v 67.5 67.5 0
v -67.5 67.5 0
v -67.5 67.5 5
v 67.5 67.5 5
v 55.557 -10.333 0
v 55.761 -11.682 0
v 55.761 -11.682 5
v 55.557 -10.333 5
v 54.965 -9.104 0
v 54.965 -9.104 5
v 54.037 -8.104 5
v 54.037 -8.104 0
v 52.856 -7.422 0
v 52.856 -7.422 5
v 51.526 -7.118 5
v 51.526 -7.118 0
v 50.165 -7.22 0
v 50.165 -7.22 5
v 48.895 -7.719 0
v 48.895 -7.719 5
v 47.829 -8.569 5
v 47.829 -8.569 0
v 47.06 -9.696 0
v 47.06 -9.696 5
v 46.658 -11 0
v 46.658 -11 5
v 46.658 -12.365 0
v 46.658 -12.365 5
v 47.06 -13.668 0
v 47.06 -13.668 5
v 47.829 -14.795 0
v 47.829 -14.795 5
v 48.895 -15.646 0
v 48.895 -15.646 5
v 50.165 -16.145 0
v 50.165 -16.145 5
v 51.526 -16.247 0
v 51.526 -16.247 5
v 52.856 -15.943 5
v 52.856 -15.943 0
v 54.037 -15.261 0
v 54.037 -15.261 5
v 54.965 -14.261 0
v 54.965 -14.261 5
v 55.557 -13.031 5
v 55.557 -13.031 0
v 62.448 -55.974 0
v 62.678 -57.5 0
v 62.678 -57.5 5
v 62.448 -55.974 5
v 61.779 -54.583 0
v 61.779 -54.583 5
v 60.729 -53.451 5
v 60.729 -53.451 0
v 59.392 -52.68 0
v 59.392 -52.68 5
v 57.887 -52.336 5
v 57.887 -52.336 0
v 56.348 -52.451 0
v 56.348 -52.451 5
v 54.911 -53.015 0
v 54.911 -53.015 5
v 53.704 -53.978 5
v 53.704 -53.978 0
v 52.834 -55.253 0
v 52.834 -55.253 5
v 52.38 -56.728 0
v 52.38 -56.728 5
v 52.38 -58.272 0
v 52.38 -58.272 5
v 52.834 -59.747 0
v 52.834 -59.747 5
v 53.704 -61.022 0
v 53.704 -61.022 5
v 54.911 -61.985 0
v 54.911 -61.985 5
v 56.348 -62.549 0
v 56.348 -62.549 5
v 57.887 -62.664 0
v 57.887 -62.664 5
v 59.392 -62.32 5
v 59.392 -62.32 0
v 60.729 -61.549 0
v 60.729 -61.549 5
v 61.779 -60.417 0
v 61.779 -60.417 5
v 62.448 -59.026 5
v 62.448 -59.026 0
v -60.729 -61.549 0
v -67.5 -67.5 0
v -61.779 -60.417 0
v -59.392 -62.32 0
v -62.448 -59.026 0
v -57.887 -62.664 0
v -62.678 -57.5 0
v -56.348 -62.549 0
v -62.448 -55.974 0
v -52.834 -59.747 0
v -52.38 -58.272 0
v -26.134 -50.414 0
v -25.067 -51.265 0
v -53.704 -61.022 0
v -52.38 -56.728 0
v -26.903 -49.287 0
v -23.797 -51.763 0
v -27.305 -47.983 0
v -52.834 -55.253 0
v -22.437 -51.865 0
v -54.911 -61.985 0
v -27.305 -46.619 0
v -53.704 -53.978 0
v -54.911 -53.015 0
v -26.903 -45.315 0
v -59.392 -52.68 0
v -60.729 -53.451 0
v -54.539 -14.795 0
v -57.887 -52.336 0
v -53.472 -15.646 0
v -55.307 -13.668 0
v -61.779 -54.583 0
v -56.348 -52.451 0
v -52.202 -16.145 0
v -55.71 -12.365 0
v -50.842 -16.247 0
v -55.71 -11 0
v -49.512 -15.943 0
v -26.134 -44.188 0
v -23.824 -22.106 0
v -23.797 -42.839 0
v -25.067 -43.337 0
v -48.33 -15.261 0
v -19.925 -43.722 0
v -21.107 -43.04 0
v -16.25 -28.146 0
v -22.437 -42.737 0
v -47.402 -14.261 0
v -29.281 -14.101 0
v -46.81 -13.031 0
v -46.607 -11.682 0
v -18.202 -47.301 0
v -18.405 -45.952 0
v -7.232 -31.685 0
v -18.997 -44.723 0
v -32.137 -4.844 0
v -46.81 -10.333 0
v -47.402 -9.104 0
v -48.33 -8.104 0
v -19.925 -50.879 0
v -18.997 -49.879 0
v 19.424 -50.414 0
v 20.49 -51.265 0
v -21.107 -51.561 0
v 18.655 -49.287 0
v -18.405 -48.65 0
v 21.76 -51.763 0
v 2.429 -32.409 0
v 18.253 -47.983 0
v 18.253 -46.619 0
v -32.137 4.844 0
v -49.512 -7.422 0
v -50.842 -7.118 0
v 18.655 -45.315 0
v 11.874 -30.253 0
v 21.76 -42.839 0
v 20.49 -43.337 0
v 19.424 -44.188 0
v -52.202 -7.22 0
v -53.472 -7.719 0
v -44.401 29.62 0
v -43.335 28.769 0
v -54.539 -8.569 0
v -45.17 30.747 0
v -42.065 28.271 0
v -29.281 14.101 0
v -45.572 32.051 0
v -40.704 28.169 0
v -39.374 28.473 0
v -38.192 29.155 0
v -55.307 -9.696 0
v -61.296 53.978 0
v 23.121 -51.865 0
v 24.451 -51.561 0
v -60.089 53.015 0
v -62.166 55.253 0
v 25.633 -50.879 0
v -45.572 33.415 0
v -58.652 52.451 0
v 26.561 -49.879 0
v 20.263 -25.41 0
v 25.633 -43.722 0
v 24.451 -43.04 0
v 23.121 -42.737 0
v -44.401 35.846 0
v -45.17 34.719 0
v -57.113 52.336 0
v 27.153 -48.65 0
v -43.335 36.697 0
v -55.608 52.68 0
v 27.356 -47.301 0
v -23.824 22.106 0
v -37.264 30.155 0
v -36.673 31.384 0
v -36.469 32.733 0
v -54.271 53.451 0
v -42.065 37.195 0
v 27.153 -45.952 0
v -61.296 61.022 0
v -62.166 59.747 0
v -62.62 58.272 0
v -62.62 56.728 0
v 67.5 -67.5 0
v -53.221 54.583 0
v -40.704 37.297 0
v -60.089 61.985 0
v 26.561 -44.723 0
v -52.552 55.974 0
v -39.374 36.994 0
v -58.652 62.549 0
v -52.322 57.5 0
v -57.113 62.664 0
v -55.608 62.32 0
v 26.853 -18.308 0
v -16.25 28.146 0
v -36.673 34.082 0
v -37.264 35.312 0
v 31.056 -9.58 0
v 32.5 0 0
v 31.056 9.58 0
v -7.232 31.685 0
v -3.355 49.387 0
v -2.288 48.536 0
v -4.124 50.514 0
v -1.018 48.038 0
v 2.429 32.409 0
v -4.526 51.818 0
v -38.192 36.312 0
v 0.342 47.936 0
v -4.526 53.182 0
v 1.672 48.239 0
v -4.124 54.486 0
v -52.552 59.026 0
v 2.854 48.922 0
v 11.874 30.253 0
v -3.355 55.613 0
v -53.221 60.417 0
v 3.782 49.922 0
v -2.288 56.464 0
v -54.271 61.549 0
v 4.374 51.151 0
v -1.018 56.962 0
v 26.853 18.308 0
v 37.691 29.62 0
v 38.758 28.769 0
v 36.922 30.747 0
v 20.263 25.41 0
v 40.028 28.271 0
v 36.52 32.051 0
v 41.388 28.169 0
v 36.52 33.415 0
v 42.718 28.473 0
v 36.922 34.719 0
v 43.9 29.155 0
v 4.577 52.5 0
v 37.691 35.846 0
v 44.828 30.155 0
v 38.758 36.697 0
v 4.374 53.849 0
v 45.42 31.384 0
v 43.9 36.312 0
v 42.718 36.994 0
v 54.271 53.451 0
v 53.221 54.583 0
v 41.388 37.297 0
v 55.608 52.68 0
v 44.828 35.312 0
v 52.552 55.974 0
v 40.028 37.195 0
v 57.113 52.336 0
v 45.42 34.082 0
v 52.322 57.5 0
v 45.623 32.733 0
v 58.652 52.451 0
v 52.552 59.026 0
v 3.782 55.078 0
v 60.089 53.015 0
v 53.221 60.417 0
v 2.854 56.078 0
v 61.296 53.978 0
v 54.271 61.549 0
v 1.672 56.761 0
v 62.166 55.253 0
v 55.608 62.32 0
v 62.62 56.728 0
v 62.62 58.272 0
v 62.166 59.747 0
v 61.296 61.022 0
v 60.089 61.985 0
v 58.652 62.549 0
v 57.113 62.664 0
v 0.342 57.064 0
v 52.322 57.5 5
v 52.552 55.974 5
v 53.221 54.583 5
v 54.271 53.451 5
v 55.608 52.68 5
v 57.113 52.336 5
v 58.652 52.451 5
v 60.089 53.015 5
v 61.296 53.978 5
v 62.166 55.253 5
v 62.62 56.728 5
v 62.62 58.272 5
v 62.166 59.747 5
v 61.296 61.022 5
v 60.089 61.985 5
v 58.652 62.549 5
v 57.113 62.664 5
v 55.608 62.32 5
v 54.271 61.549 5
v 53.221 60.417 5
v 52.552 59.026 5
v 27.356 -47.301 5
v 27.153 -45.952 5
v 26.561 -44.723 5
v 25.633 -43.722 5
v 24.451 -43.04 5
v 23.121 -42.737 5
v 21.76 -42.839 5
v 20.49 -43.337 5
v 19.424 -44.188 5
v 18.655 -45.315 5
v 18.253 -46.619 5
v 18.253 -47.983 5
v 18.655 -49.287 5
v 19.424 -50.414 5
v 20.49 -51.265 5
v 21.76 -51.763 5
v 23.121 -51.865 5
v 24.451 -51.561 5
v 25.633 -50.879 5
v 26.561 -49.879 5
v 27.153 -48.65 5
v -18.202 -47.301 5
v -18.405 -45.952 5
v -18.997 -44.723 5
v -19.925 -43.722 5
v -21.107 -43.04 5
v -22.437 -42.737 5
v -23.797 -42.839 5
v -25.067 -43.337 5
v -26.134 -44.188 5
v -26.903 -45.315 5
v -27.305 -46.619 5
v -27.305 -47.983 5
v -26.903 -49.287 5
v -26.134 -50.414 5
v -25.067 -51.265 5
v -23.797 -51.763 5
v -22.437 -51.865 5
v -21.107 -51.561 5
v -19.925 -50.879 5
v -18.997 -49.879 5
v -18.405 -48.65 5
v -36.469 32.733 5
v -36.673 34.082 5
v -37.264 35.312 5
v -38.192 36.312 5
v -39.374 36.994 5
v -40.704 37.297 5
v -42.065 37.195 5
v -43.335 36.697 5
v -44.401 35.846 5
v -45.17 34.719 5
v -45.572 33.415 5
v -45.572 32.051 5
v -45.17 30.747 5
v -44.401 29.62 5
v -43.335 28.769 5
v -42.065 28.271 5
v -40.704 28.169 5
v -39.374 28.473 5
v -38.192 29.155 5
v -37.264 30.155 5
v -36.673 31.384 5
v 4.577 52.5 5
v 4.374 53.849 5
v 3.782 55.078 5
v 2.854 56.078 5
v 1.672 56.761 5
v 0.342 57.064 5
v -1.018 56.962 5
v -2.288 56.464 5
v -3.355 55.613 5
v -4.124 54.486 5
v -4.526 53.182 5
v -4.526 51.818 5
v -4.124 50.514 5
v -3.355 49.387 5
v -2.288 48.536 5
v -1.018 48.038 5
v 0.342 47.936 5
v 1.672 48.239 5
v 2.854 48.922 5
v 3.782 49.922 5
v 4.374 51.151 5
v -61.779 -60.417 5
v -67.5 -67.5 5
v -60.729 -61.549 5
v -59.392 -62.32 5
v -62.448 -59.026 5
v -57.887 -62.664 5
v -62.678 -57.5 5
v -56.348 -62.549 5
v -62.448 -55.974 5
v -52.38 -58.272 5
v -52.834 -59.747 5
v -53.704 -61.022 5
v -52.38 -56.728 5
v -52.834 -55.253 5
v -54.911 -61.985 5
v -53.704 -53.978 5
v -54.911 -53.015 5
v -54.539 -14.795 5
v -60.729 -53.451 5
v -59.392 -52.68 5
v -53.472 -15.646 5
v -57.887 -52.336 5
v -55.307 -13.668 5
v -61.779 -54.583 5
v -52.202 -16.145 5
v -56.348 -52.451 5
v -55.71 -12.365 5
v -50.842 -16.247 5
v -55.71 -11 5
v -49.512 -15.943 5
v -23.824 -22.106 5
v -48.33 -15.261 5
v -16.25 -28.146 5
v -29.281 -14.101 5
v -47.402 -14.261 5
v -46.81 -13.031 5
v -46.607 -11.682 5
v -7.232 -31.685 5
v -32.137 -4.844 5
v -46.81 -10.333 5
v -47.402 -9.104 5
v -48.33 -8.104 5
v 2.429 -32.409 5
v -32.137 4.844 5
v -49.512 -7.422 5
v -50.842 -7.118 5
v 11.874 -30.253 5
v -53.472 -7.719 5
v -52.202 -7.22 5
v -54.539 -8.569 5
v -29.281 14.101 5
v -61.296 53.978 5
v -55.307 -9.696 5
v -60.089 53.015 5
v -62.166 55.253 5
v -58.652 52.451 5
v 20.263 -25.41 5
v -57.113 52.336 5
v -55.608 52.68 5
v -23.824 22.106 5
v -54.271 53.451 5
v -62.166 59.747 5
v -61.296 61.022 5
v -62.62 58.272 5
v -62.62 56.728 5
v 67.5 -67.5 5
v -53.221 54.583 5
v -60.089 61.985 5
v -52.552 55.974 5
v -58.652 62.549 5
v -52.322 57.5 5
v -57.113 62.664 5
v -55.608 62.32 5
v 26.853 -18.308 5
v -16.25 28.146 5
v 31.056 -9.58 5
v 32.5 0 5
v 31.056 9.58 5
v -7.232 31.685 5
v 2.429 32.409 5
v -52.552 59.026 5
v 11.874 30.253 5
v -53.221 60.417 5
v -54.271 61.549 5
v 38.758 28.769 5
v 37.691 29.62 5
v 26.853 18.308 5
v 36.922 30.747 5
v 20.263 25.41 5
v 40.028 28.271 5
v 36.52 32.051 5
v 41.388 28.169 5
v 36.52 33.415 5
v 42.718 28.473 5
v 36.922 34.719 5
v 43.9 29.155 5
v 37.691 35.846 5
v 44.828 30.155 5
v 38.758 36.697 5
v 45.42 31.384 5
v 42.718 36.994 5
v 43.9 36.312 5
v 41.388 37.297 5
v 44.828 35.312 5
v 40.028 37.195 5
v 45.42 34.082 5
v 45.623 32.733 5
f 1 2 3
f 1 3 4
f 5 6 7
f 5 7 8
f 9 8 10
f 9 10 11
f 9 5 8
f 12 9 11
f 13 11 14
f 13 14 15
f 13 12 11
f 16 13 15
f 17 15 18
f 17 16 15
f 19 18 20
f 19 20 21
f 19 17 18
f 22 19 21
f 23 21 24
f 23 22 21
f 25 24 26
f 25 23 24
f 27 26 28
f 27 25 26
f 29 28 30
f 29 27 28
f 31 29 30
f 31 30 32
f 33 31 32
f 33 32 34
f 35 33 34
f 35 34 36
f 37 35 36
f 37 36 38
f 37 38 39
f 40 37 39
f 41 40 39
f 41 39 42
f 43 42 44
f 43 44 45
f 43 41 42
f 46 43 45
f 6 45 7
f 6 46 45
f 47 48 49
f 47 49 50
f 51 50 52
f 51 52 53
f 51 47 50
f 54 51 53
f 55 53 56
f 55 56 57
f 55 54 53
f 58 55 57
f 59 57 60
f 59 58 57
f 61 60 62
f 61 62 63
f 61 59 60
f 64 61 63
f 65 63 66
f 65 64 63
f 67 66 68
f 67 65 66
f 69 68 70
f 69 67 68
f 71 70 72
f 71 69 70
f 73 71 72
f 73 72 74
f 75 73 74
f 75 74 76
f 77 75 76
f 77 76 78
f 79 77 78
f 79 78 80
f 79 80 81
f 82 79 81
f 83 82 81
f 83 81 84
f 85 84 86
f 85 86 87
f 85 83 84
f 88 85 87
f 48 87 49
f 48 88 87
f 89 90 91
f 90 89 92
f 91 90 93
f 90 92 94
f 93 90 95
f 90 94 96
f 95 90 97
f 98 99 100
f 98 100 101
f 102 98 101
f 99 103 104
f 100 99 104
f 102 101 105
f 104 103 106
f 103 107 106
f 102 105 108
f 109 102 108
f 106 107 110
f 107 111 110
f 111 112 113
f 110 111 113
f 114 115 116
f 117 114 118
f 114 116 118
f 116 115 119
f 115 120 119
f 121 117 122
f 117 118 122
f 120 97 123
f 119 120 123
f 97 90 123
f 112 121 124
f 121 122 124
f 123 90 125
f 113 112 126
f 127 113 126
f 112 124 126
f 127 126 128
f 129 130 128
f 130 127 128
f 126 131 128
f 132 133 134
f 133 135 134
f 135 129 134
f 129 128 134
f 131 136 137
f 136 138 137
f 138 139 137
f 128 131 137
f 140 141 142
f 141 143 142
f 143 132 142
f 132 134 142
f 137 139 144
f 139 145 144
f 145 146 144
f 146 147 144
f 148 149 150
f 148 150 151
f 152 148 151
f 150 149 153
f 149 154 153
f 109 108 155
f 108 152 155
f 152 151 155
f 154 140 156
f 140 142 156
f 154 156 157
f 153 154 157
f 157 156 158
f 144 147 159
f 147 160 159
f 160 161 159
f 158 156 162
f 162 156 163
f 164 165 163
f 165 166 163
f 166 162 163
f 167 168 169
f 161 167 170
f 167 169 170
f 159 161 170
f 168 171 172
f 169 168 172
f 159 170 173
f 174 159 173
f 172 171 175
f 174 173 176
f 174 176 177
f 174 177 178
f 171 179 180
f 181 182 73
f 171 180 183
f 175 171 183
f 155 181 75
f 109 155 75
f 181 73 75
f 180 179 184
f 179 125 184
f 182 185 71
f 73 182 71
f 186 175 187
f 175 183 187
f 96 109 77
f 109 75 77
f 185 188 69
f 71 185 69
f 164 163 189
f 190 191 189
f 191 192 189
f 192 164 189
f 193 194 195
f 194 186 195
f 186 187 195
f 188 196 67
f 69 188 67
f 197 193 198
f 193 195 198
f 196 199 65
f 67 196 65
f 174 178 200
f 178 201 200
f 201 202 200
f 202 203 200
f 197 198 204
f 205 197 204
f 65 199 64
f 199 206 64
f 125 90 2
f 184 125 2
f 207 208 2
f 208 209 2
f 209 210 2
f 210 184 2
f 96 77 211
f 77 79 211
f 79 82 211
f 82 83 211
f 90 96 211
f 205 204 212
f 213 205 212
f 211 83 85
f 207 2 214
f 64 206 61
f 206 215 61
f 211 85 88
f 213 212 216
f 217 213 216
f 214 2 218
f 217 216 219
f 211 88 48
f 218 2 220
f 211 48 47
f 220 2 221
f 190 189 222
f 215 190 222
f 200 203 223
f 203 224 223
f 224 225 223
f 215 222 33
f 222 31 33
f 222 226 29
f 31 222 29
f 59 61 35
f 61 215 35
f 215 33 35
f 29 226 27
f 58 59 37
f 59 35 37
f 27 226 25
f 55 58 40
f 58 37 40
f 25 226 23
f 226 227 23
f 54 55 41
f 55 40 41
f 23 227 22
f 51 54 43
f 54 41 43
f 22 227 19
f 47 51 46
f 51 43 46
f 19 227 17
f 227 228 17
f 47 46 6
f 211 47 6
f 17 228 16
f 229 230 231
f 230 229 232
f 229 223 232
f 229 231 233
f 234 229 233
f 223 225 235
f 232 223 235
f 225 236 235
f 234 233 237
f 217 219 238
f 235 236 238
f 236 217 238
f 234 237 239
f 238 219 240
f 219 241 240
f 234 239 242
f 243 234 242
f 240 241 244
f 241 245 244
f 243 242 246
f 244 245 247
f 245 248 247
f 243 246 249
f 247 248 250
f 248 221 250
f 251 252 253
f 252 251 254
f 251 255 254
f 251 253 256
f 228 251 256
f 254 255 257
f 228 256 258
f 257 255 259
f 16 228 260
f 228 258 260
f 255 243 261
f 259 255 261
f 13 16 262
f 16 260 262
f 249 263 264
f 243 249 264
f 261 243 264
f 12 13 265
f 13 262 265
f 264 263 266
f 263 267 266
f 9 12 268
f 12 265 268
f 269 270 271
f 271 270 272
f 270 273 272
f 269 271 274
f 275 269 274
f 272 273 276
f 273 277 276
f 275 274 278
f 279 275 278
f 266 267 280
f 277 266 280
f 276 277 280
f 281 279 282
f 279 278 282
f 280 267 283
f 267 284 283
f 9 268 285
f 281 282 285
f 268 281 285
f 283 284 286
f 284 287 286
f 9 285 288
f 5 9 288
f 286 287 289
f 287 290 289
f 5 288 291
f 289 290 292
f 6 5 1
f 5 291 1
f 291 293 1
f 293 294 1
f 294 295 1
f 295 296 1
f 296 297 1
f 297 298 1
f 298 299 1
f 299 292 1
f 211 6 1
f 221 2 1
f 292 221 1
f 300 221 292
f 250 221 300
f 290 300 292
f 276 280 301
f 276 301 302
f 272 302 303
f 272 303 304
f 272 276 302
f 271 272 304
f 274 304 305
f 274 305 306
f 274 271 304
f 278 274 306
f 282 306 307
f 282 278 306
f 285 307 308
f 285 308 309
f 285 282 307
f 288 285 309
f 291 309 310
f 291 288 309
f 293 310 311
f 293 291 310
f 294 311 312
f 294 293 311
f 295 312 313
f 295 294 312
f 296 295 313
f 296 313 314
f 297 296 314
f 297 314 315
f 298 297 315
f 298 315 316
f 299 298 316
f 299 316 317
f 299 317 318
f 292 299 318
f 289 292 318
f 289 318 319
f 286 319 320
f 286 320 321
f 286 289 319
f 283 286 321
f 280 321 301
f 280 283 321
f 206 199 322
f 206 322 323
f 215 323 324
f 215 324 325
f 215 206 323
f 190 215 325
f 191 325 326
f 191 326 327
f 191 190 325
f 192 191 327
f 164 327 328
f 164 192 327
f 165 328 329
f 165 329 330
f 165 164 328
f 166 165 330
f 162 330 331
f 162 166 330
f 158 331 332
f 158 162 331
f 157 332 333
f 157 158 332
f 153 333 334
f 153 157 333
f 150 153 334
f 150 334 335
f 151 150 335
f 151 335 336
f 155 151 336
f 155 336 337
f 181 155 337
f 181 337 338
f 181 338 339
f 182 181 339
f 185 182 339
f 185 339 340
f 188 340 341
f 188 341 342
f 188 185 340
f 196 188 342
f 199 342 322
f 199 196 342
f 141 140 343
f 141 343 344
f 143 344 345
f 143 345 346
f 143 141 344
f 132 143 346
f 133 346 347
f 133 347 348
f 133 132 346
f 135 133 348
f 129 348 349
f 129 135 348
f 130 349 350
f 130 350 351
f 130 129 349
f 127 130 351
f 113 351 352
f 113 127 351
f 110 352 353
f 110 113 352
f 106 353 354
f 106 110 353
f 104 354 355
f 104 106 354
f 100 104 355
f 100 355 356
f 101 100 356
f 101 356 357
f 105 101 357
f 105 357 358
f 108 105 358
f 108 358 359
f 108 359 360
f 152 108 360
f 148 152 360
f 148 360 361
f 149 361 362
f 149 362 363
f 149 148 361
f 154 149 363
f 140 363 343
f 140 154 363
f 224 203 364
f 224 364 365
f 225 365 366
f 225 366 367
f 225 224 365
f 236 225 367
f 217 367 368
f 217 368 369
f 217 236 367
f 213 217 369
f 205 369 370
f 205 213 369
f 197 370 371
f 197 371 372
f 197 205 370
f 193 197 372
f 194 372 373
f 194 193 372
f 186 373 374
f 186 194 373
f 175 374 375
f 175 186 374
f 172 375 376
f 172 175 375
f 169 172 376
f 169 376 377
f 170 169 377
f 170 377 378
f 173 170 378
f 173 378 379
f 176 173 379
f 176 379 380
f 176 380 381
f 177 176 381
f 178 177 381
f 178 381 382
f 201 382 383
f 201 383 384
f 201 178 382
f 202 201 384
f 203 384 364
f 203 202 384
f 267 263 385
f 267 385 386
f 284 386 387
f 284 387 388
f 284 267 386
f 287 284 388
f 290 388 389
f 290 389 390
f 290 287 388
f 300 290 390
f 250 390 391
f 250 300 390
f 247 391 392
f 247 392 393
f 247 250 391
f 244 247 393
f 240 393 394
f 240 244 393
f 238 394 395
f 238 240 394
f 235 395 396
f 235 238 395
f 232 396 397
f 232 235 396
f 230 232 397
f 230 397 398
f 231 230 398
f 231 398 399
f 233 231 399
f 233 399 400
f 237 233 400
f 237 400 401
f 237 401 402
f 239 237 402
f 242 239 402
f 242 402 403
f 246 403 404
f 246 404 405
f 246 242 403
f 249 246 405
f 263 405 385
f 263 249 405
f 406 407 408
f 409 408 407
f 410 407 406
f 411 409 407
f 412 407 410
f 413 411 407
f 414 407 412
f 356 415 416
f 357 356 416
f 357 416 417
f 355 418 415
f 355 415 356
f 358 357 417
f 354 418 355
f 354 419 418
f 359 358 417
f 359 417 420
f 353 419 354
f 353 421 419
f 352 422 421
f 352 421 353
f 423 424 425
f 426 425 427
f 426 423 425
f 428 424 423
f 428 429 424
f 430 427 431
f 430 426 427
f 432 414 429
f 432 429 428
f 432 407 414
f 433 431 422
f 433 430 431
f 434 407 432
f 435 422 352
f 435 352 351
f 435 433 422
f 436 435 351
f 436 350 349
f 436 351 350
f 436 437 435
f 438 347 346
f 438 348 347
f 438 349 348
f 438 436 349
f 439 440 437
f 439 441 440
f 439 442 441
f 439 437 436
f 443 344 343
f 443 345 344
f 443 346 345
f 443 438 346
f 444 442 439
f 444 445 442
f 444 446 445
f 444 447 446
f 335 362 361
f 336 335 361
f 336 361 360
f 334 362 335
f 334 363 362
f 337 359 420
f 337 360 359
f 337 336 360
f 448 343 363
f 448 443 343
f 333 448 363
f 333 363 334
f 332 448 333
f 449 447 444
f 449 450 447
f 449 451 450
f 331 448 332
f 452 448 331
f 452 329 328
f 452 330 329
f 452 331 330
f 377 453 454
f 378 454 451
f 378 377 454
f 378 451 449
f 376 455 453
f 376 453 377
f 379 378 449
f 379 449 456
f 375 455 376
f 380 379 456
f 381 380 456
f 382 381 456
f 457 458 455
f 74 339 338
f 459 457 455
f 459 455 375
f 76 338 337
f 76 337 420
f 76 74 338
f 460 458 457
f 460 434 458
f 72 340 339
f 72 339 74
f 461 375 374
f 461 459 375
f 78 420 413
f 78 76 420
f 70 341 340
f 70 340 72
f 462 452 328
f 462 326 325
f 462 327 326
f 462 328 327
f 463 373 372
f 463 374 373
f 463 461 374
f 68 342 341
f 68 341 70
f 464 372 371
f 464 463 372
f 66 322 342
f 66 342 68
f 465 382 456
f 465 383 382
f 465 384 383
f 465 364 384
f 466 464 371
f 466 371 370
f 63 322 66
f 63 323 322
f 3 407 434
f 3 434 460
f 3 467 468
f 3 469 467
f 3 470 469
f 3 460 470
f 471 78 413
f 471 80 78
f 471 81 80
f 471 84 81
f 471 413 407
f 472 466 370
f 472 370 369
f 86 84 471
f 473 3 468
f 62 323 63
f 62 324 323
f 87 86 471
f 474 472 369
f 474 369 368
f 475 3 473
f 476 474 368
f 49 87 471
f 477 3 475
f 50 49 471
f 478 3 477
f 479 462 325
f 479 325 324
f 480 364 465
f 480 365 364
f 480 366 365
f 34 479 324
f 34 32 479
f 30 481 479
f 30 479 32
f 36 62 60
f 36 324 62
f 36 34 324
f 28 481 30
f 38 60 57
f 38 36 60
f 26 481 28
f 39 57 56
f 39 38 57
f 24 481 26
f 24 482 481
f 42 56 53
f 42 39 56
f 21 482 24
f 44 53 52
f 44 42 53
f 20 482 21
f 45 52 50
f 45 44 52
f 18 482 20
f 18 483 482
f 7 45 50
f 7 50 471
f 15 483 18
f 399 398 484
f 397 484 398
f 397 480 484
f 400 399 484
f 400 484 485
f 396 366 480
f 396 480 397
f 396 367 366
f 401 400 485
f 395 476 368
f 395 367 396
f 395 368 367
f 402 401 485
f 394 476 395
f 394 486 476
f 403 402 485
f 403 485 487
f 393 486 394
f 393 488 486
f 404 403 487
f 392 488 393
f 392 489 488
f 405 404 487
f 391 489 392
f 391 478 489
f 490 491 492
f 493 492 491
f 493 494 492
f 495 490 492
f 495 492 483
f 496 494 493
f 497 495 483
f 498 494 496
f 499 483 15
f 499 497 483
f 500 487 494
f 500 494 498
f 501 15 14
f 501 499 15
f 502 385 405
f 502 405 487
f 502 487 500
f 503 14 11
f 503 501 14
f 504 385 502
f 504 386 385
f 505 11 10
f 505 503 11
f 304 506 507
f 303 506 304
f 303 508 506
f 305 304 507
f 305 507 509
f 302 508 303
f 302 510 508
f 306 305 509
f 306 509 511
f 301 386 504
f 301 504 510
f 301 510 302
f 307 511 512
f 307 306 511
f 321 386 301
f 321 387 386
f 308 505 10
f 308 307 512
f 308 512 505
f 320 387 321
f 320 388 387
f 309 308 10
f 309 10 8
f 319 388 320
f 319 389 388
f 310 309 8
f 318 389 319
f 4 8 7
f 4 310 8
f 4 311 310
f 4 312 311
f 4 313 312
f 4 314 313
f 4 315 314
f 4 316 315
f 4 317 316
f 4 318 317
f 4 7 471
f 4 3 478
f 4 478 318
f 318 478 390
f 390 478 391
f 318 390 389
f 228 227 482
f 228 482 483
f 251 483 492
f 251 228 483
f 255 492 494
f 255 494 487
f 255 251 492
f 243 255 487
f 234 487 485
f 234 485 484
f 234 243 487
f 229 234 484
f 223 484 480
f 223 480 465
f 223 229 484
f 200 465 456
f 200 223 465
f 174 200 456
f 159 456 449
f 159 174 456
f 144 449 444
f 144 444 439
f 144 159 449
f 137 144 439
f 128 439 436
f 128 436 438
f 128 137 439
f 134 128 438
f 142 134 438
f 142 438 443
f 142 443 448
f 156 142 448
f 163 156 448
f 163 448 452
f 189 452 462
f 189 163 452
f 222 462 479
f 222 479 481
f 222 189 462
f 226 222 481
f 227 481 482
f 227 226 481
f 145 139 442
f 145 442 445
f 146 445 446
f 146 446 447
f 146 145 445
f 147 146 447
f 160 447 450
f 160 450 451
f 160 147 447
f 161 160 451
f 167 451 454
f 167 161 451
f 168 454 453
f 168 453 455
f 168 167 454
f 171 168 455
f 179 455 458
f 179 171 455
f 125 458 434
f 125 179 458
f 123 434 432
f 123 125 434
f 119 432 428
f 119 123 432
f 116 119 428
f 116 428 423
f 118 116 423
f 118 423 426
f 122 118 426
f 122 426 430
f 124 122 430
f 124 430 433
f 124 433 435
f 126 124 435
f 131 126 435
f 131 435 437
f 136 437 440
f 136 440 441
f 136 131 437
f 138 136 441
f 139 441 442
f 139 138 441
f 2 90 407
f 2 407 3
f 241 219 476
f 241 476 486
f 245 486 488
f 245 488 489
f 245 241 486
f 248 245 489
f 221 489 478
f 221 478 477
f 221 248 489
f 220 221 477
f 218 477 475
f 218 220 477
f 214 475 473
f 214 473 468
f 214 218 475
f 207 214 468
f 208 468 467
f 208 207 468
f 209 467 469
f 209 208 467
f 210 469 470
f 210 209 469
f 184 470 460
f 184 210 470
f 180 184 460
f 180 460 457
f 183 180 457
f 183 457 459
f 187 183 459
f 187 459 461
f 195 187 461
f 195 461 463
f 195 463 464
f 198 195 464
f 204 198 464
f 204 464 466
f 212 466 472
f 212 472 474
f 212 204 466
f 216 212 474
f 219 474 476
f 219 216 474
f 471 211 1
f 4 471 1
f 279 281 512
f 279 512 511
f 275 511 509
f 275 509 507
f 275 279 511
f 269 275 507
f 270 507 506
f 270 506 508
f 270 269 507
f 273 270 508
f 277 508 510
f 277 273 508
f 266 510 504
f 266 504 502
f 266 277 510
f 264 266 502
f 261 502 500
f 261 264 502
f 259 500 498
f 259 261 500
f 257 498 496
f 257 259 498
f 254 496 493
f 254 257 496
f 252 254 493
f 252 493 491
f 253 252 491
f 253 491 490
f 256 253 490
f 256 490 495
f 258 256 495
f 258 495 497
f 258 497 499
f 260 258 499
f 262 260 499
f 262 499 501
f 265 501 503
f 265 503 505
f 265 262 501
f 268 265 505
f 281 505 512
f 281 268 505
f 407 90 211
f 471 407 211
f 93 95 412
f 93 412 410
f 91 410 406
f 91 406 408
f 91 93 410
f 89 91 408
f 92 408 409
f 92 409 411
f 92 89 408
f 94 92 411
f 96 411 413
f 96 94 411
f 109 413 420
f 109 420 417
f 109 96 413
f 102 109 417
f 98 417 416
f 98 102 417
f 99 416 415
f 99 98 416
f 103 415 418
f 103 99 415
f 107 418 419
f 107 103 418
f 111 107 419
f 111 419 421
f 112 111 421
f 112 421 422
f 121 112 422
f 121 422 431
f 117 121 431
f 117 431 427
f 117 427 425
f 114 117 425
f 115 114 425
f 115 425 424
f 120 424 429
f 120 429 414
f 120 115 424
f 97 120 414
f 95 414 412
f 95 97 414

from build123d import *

# Parameters (mm, degrees)
ESBO_O1_W                = 135
ESBO_O1_H                = 135
ESBO_O1_R                = 5.178334598
ESBO_O1_R_2              = 32.5
ESBO_O1_R_3              = 4.576992867
RESSALTO_EXTRUS_O3_DEPTH = 5


with BuildPart() as part:
    # Esboço1 → Ressalto-extrusão3 (new body)
    with BuildSketch(Plane.XY):
        Rectangle(ESBO_O1_W, ESBO_O1_H)
        with Locations((-57.5, 57.5)):
            Circle(ESBO_O1_R, mode=Mode.SUBTRACT)
        with Locations(Location((-57.5, -57.5, 0), (0, 0, 180))):
            Circle(ESBO_O1_R, mode=Mode.SUBTRACT)
        with Locations((57.5, -57.5)):
            Circle(ESBO_O1_R, mode=Mode.SUBTRACT)
        with Locations(Location((57.5, 57.5, 0), (0, 0, 180))):
            Circle(ESBO_O1_R, mode=Mode.SUBTRACT)
        Circle(ESBO_O1_R_2, mode=Mode.SUBTRACT)
        with Locations((0, 52.5)):
            Circle(ESBO_O1_R_3, mode=Mode.SUBTRACT)
        with Locations((41.04615283, 32.733214598)):
            Circle(ESBO_O1_R_3, mode=Mode.SUBTRACT)
        with Locations((51.18371539, -11.682349033)):
            Circle(ESBO_O1_R_3, mode=Mode.SUBTRACT)
        with Locations((22.778896304, -47.300865565)):
            Circle(ESBO_O1_R_3, mode=Mode.SUBTRACT)
        with Locations((-22.778896304, -47.300865565)):
            Circle(ESBO_O1_R_3, mode=Mode.SUBTRACT)
        with Locations((-51.18371539, -11.682349033)):
            Circle(ESBO_O1_R_3, mode=Mode.SUBTRACT)
        with Locations((-41.04615283, 32.733214598)):
            Circle(ESBO_O1_R_3, mode=Mode.SUBTRACT)
    extrude(amount=RESSALTO_EXTRUS_O3_DEPTH)


solid = part.part
